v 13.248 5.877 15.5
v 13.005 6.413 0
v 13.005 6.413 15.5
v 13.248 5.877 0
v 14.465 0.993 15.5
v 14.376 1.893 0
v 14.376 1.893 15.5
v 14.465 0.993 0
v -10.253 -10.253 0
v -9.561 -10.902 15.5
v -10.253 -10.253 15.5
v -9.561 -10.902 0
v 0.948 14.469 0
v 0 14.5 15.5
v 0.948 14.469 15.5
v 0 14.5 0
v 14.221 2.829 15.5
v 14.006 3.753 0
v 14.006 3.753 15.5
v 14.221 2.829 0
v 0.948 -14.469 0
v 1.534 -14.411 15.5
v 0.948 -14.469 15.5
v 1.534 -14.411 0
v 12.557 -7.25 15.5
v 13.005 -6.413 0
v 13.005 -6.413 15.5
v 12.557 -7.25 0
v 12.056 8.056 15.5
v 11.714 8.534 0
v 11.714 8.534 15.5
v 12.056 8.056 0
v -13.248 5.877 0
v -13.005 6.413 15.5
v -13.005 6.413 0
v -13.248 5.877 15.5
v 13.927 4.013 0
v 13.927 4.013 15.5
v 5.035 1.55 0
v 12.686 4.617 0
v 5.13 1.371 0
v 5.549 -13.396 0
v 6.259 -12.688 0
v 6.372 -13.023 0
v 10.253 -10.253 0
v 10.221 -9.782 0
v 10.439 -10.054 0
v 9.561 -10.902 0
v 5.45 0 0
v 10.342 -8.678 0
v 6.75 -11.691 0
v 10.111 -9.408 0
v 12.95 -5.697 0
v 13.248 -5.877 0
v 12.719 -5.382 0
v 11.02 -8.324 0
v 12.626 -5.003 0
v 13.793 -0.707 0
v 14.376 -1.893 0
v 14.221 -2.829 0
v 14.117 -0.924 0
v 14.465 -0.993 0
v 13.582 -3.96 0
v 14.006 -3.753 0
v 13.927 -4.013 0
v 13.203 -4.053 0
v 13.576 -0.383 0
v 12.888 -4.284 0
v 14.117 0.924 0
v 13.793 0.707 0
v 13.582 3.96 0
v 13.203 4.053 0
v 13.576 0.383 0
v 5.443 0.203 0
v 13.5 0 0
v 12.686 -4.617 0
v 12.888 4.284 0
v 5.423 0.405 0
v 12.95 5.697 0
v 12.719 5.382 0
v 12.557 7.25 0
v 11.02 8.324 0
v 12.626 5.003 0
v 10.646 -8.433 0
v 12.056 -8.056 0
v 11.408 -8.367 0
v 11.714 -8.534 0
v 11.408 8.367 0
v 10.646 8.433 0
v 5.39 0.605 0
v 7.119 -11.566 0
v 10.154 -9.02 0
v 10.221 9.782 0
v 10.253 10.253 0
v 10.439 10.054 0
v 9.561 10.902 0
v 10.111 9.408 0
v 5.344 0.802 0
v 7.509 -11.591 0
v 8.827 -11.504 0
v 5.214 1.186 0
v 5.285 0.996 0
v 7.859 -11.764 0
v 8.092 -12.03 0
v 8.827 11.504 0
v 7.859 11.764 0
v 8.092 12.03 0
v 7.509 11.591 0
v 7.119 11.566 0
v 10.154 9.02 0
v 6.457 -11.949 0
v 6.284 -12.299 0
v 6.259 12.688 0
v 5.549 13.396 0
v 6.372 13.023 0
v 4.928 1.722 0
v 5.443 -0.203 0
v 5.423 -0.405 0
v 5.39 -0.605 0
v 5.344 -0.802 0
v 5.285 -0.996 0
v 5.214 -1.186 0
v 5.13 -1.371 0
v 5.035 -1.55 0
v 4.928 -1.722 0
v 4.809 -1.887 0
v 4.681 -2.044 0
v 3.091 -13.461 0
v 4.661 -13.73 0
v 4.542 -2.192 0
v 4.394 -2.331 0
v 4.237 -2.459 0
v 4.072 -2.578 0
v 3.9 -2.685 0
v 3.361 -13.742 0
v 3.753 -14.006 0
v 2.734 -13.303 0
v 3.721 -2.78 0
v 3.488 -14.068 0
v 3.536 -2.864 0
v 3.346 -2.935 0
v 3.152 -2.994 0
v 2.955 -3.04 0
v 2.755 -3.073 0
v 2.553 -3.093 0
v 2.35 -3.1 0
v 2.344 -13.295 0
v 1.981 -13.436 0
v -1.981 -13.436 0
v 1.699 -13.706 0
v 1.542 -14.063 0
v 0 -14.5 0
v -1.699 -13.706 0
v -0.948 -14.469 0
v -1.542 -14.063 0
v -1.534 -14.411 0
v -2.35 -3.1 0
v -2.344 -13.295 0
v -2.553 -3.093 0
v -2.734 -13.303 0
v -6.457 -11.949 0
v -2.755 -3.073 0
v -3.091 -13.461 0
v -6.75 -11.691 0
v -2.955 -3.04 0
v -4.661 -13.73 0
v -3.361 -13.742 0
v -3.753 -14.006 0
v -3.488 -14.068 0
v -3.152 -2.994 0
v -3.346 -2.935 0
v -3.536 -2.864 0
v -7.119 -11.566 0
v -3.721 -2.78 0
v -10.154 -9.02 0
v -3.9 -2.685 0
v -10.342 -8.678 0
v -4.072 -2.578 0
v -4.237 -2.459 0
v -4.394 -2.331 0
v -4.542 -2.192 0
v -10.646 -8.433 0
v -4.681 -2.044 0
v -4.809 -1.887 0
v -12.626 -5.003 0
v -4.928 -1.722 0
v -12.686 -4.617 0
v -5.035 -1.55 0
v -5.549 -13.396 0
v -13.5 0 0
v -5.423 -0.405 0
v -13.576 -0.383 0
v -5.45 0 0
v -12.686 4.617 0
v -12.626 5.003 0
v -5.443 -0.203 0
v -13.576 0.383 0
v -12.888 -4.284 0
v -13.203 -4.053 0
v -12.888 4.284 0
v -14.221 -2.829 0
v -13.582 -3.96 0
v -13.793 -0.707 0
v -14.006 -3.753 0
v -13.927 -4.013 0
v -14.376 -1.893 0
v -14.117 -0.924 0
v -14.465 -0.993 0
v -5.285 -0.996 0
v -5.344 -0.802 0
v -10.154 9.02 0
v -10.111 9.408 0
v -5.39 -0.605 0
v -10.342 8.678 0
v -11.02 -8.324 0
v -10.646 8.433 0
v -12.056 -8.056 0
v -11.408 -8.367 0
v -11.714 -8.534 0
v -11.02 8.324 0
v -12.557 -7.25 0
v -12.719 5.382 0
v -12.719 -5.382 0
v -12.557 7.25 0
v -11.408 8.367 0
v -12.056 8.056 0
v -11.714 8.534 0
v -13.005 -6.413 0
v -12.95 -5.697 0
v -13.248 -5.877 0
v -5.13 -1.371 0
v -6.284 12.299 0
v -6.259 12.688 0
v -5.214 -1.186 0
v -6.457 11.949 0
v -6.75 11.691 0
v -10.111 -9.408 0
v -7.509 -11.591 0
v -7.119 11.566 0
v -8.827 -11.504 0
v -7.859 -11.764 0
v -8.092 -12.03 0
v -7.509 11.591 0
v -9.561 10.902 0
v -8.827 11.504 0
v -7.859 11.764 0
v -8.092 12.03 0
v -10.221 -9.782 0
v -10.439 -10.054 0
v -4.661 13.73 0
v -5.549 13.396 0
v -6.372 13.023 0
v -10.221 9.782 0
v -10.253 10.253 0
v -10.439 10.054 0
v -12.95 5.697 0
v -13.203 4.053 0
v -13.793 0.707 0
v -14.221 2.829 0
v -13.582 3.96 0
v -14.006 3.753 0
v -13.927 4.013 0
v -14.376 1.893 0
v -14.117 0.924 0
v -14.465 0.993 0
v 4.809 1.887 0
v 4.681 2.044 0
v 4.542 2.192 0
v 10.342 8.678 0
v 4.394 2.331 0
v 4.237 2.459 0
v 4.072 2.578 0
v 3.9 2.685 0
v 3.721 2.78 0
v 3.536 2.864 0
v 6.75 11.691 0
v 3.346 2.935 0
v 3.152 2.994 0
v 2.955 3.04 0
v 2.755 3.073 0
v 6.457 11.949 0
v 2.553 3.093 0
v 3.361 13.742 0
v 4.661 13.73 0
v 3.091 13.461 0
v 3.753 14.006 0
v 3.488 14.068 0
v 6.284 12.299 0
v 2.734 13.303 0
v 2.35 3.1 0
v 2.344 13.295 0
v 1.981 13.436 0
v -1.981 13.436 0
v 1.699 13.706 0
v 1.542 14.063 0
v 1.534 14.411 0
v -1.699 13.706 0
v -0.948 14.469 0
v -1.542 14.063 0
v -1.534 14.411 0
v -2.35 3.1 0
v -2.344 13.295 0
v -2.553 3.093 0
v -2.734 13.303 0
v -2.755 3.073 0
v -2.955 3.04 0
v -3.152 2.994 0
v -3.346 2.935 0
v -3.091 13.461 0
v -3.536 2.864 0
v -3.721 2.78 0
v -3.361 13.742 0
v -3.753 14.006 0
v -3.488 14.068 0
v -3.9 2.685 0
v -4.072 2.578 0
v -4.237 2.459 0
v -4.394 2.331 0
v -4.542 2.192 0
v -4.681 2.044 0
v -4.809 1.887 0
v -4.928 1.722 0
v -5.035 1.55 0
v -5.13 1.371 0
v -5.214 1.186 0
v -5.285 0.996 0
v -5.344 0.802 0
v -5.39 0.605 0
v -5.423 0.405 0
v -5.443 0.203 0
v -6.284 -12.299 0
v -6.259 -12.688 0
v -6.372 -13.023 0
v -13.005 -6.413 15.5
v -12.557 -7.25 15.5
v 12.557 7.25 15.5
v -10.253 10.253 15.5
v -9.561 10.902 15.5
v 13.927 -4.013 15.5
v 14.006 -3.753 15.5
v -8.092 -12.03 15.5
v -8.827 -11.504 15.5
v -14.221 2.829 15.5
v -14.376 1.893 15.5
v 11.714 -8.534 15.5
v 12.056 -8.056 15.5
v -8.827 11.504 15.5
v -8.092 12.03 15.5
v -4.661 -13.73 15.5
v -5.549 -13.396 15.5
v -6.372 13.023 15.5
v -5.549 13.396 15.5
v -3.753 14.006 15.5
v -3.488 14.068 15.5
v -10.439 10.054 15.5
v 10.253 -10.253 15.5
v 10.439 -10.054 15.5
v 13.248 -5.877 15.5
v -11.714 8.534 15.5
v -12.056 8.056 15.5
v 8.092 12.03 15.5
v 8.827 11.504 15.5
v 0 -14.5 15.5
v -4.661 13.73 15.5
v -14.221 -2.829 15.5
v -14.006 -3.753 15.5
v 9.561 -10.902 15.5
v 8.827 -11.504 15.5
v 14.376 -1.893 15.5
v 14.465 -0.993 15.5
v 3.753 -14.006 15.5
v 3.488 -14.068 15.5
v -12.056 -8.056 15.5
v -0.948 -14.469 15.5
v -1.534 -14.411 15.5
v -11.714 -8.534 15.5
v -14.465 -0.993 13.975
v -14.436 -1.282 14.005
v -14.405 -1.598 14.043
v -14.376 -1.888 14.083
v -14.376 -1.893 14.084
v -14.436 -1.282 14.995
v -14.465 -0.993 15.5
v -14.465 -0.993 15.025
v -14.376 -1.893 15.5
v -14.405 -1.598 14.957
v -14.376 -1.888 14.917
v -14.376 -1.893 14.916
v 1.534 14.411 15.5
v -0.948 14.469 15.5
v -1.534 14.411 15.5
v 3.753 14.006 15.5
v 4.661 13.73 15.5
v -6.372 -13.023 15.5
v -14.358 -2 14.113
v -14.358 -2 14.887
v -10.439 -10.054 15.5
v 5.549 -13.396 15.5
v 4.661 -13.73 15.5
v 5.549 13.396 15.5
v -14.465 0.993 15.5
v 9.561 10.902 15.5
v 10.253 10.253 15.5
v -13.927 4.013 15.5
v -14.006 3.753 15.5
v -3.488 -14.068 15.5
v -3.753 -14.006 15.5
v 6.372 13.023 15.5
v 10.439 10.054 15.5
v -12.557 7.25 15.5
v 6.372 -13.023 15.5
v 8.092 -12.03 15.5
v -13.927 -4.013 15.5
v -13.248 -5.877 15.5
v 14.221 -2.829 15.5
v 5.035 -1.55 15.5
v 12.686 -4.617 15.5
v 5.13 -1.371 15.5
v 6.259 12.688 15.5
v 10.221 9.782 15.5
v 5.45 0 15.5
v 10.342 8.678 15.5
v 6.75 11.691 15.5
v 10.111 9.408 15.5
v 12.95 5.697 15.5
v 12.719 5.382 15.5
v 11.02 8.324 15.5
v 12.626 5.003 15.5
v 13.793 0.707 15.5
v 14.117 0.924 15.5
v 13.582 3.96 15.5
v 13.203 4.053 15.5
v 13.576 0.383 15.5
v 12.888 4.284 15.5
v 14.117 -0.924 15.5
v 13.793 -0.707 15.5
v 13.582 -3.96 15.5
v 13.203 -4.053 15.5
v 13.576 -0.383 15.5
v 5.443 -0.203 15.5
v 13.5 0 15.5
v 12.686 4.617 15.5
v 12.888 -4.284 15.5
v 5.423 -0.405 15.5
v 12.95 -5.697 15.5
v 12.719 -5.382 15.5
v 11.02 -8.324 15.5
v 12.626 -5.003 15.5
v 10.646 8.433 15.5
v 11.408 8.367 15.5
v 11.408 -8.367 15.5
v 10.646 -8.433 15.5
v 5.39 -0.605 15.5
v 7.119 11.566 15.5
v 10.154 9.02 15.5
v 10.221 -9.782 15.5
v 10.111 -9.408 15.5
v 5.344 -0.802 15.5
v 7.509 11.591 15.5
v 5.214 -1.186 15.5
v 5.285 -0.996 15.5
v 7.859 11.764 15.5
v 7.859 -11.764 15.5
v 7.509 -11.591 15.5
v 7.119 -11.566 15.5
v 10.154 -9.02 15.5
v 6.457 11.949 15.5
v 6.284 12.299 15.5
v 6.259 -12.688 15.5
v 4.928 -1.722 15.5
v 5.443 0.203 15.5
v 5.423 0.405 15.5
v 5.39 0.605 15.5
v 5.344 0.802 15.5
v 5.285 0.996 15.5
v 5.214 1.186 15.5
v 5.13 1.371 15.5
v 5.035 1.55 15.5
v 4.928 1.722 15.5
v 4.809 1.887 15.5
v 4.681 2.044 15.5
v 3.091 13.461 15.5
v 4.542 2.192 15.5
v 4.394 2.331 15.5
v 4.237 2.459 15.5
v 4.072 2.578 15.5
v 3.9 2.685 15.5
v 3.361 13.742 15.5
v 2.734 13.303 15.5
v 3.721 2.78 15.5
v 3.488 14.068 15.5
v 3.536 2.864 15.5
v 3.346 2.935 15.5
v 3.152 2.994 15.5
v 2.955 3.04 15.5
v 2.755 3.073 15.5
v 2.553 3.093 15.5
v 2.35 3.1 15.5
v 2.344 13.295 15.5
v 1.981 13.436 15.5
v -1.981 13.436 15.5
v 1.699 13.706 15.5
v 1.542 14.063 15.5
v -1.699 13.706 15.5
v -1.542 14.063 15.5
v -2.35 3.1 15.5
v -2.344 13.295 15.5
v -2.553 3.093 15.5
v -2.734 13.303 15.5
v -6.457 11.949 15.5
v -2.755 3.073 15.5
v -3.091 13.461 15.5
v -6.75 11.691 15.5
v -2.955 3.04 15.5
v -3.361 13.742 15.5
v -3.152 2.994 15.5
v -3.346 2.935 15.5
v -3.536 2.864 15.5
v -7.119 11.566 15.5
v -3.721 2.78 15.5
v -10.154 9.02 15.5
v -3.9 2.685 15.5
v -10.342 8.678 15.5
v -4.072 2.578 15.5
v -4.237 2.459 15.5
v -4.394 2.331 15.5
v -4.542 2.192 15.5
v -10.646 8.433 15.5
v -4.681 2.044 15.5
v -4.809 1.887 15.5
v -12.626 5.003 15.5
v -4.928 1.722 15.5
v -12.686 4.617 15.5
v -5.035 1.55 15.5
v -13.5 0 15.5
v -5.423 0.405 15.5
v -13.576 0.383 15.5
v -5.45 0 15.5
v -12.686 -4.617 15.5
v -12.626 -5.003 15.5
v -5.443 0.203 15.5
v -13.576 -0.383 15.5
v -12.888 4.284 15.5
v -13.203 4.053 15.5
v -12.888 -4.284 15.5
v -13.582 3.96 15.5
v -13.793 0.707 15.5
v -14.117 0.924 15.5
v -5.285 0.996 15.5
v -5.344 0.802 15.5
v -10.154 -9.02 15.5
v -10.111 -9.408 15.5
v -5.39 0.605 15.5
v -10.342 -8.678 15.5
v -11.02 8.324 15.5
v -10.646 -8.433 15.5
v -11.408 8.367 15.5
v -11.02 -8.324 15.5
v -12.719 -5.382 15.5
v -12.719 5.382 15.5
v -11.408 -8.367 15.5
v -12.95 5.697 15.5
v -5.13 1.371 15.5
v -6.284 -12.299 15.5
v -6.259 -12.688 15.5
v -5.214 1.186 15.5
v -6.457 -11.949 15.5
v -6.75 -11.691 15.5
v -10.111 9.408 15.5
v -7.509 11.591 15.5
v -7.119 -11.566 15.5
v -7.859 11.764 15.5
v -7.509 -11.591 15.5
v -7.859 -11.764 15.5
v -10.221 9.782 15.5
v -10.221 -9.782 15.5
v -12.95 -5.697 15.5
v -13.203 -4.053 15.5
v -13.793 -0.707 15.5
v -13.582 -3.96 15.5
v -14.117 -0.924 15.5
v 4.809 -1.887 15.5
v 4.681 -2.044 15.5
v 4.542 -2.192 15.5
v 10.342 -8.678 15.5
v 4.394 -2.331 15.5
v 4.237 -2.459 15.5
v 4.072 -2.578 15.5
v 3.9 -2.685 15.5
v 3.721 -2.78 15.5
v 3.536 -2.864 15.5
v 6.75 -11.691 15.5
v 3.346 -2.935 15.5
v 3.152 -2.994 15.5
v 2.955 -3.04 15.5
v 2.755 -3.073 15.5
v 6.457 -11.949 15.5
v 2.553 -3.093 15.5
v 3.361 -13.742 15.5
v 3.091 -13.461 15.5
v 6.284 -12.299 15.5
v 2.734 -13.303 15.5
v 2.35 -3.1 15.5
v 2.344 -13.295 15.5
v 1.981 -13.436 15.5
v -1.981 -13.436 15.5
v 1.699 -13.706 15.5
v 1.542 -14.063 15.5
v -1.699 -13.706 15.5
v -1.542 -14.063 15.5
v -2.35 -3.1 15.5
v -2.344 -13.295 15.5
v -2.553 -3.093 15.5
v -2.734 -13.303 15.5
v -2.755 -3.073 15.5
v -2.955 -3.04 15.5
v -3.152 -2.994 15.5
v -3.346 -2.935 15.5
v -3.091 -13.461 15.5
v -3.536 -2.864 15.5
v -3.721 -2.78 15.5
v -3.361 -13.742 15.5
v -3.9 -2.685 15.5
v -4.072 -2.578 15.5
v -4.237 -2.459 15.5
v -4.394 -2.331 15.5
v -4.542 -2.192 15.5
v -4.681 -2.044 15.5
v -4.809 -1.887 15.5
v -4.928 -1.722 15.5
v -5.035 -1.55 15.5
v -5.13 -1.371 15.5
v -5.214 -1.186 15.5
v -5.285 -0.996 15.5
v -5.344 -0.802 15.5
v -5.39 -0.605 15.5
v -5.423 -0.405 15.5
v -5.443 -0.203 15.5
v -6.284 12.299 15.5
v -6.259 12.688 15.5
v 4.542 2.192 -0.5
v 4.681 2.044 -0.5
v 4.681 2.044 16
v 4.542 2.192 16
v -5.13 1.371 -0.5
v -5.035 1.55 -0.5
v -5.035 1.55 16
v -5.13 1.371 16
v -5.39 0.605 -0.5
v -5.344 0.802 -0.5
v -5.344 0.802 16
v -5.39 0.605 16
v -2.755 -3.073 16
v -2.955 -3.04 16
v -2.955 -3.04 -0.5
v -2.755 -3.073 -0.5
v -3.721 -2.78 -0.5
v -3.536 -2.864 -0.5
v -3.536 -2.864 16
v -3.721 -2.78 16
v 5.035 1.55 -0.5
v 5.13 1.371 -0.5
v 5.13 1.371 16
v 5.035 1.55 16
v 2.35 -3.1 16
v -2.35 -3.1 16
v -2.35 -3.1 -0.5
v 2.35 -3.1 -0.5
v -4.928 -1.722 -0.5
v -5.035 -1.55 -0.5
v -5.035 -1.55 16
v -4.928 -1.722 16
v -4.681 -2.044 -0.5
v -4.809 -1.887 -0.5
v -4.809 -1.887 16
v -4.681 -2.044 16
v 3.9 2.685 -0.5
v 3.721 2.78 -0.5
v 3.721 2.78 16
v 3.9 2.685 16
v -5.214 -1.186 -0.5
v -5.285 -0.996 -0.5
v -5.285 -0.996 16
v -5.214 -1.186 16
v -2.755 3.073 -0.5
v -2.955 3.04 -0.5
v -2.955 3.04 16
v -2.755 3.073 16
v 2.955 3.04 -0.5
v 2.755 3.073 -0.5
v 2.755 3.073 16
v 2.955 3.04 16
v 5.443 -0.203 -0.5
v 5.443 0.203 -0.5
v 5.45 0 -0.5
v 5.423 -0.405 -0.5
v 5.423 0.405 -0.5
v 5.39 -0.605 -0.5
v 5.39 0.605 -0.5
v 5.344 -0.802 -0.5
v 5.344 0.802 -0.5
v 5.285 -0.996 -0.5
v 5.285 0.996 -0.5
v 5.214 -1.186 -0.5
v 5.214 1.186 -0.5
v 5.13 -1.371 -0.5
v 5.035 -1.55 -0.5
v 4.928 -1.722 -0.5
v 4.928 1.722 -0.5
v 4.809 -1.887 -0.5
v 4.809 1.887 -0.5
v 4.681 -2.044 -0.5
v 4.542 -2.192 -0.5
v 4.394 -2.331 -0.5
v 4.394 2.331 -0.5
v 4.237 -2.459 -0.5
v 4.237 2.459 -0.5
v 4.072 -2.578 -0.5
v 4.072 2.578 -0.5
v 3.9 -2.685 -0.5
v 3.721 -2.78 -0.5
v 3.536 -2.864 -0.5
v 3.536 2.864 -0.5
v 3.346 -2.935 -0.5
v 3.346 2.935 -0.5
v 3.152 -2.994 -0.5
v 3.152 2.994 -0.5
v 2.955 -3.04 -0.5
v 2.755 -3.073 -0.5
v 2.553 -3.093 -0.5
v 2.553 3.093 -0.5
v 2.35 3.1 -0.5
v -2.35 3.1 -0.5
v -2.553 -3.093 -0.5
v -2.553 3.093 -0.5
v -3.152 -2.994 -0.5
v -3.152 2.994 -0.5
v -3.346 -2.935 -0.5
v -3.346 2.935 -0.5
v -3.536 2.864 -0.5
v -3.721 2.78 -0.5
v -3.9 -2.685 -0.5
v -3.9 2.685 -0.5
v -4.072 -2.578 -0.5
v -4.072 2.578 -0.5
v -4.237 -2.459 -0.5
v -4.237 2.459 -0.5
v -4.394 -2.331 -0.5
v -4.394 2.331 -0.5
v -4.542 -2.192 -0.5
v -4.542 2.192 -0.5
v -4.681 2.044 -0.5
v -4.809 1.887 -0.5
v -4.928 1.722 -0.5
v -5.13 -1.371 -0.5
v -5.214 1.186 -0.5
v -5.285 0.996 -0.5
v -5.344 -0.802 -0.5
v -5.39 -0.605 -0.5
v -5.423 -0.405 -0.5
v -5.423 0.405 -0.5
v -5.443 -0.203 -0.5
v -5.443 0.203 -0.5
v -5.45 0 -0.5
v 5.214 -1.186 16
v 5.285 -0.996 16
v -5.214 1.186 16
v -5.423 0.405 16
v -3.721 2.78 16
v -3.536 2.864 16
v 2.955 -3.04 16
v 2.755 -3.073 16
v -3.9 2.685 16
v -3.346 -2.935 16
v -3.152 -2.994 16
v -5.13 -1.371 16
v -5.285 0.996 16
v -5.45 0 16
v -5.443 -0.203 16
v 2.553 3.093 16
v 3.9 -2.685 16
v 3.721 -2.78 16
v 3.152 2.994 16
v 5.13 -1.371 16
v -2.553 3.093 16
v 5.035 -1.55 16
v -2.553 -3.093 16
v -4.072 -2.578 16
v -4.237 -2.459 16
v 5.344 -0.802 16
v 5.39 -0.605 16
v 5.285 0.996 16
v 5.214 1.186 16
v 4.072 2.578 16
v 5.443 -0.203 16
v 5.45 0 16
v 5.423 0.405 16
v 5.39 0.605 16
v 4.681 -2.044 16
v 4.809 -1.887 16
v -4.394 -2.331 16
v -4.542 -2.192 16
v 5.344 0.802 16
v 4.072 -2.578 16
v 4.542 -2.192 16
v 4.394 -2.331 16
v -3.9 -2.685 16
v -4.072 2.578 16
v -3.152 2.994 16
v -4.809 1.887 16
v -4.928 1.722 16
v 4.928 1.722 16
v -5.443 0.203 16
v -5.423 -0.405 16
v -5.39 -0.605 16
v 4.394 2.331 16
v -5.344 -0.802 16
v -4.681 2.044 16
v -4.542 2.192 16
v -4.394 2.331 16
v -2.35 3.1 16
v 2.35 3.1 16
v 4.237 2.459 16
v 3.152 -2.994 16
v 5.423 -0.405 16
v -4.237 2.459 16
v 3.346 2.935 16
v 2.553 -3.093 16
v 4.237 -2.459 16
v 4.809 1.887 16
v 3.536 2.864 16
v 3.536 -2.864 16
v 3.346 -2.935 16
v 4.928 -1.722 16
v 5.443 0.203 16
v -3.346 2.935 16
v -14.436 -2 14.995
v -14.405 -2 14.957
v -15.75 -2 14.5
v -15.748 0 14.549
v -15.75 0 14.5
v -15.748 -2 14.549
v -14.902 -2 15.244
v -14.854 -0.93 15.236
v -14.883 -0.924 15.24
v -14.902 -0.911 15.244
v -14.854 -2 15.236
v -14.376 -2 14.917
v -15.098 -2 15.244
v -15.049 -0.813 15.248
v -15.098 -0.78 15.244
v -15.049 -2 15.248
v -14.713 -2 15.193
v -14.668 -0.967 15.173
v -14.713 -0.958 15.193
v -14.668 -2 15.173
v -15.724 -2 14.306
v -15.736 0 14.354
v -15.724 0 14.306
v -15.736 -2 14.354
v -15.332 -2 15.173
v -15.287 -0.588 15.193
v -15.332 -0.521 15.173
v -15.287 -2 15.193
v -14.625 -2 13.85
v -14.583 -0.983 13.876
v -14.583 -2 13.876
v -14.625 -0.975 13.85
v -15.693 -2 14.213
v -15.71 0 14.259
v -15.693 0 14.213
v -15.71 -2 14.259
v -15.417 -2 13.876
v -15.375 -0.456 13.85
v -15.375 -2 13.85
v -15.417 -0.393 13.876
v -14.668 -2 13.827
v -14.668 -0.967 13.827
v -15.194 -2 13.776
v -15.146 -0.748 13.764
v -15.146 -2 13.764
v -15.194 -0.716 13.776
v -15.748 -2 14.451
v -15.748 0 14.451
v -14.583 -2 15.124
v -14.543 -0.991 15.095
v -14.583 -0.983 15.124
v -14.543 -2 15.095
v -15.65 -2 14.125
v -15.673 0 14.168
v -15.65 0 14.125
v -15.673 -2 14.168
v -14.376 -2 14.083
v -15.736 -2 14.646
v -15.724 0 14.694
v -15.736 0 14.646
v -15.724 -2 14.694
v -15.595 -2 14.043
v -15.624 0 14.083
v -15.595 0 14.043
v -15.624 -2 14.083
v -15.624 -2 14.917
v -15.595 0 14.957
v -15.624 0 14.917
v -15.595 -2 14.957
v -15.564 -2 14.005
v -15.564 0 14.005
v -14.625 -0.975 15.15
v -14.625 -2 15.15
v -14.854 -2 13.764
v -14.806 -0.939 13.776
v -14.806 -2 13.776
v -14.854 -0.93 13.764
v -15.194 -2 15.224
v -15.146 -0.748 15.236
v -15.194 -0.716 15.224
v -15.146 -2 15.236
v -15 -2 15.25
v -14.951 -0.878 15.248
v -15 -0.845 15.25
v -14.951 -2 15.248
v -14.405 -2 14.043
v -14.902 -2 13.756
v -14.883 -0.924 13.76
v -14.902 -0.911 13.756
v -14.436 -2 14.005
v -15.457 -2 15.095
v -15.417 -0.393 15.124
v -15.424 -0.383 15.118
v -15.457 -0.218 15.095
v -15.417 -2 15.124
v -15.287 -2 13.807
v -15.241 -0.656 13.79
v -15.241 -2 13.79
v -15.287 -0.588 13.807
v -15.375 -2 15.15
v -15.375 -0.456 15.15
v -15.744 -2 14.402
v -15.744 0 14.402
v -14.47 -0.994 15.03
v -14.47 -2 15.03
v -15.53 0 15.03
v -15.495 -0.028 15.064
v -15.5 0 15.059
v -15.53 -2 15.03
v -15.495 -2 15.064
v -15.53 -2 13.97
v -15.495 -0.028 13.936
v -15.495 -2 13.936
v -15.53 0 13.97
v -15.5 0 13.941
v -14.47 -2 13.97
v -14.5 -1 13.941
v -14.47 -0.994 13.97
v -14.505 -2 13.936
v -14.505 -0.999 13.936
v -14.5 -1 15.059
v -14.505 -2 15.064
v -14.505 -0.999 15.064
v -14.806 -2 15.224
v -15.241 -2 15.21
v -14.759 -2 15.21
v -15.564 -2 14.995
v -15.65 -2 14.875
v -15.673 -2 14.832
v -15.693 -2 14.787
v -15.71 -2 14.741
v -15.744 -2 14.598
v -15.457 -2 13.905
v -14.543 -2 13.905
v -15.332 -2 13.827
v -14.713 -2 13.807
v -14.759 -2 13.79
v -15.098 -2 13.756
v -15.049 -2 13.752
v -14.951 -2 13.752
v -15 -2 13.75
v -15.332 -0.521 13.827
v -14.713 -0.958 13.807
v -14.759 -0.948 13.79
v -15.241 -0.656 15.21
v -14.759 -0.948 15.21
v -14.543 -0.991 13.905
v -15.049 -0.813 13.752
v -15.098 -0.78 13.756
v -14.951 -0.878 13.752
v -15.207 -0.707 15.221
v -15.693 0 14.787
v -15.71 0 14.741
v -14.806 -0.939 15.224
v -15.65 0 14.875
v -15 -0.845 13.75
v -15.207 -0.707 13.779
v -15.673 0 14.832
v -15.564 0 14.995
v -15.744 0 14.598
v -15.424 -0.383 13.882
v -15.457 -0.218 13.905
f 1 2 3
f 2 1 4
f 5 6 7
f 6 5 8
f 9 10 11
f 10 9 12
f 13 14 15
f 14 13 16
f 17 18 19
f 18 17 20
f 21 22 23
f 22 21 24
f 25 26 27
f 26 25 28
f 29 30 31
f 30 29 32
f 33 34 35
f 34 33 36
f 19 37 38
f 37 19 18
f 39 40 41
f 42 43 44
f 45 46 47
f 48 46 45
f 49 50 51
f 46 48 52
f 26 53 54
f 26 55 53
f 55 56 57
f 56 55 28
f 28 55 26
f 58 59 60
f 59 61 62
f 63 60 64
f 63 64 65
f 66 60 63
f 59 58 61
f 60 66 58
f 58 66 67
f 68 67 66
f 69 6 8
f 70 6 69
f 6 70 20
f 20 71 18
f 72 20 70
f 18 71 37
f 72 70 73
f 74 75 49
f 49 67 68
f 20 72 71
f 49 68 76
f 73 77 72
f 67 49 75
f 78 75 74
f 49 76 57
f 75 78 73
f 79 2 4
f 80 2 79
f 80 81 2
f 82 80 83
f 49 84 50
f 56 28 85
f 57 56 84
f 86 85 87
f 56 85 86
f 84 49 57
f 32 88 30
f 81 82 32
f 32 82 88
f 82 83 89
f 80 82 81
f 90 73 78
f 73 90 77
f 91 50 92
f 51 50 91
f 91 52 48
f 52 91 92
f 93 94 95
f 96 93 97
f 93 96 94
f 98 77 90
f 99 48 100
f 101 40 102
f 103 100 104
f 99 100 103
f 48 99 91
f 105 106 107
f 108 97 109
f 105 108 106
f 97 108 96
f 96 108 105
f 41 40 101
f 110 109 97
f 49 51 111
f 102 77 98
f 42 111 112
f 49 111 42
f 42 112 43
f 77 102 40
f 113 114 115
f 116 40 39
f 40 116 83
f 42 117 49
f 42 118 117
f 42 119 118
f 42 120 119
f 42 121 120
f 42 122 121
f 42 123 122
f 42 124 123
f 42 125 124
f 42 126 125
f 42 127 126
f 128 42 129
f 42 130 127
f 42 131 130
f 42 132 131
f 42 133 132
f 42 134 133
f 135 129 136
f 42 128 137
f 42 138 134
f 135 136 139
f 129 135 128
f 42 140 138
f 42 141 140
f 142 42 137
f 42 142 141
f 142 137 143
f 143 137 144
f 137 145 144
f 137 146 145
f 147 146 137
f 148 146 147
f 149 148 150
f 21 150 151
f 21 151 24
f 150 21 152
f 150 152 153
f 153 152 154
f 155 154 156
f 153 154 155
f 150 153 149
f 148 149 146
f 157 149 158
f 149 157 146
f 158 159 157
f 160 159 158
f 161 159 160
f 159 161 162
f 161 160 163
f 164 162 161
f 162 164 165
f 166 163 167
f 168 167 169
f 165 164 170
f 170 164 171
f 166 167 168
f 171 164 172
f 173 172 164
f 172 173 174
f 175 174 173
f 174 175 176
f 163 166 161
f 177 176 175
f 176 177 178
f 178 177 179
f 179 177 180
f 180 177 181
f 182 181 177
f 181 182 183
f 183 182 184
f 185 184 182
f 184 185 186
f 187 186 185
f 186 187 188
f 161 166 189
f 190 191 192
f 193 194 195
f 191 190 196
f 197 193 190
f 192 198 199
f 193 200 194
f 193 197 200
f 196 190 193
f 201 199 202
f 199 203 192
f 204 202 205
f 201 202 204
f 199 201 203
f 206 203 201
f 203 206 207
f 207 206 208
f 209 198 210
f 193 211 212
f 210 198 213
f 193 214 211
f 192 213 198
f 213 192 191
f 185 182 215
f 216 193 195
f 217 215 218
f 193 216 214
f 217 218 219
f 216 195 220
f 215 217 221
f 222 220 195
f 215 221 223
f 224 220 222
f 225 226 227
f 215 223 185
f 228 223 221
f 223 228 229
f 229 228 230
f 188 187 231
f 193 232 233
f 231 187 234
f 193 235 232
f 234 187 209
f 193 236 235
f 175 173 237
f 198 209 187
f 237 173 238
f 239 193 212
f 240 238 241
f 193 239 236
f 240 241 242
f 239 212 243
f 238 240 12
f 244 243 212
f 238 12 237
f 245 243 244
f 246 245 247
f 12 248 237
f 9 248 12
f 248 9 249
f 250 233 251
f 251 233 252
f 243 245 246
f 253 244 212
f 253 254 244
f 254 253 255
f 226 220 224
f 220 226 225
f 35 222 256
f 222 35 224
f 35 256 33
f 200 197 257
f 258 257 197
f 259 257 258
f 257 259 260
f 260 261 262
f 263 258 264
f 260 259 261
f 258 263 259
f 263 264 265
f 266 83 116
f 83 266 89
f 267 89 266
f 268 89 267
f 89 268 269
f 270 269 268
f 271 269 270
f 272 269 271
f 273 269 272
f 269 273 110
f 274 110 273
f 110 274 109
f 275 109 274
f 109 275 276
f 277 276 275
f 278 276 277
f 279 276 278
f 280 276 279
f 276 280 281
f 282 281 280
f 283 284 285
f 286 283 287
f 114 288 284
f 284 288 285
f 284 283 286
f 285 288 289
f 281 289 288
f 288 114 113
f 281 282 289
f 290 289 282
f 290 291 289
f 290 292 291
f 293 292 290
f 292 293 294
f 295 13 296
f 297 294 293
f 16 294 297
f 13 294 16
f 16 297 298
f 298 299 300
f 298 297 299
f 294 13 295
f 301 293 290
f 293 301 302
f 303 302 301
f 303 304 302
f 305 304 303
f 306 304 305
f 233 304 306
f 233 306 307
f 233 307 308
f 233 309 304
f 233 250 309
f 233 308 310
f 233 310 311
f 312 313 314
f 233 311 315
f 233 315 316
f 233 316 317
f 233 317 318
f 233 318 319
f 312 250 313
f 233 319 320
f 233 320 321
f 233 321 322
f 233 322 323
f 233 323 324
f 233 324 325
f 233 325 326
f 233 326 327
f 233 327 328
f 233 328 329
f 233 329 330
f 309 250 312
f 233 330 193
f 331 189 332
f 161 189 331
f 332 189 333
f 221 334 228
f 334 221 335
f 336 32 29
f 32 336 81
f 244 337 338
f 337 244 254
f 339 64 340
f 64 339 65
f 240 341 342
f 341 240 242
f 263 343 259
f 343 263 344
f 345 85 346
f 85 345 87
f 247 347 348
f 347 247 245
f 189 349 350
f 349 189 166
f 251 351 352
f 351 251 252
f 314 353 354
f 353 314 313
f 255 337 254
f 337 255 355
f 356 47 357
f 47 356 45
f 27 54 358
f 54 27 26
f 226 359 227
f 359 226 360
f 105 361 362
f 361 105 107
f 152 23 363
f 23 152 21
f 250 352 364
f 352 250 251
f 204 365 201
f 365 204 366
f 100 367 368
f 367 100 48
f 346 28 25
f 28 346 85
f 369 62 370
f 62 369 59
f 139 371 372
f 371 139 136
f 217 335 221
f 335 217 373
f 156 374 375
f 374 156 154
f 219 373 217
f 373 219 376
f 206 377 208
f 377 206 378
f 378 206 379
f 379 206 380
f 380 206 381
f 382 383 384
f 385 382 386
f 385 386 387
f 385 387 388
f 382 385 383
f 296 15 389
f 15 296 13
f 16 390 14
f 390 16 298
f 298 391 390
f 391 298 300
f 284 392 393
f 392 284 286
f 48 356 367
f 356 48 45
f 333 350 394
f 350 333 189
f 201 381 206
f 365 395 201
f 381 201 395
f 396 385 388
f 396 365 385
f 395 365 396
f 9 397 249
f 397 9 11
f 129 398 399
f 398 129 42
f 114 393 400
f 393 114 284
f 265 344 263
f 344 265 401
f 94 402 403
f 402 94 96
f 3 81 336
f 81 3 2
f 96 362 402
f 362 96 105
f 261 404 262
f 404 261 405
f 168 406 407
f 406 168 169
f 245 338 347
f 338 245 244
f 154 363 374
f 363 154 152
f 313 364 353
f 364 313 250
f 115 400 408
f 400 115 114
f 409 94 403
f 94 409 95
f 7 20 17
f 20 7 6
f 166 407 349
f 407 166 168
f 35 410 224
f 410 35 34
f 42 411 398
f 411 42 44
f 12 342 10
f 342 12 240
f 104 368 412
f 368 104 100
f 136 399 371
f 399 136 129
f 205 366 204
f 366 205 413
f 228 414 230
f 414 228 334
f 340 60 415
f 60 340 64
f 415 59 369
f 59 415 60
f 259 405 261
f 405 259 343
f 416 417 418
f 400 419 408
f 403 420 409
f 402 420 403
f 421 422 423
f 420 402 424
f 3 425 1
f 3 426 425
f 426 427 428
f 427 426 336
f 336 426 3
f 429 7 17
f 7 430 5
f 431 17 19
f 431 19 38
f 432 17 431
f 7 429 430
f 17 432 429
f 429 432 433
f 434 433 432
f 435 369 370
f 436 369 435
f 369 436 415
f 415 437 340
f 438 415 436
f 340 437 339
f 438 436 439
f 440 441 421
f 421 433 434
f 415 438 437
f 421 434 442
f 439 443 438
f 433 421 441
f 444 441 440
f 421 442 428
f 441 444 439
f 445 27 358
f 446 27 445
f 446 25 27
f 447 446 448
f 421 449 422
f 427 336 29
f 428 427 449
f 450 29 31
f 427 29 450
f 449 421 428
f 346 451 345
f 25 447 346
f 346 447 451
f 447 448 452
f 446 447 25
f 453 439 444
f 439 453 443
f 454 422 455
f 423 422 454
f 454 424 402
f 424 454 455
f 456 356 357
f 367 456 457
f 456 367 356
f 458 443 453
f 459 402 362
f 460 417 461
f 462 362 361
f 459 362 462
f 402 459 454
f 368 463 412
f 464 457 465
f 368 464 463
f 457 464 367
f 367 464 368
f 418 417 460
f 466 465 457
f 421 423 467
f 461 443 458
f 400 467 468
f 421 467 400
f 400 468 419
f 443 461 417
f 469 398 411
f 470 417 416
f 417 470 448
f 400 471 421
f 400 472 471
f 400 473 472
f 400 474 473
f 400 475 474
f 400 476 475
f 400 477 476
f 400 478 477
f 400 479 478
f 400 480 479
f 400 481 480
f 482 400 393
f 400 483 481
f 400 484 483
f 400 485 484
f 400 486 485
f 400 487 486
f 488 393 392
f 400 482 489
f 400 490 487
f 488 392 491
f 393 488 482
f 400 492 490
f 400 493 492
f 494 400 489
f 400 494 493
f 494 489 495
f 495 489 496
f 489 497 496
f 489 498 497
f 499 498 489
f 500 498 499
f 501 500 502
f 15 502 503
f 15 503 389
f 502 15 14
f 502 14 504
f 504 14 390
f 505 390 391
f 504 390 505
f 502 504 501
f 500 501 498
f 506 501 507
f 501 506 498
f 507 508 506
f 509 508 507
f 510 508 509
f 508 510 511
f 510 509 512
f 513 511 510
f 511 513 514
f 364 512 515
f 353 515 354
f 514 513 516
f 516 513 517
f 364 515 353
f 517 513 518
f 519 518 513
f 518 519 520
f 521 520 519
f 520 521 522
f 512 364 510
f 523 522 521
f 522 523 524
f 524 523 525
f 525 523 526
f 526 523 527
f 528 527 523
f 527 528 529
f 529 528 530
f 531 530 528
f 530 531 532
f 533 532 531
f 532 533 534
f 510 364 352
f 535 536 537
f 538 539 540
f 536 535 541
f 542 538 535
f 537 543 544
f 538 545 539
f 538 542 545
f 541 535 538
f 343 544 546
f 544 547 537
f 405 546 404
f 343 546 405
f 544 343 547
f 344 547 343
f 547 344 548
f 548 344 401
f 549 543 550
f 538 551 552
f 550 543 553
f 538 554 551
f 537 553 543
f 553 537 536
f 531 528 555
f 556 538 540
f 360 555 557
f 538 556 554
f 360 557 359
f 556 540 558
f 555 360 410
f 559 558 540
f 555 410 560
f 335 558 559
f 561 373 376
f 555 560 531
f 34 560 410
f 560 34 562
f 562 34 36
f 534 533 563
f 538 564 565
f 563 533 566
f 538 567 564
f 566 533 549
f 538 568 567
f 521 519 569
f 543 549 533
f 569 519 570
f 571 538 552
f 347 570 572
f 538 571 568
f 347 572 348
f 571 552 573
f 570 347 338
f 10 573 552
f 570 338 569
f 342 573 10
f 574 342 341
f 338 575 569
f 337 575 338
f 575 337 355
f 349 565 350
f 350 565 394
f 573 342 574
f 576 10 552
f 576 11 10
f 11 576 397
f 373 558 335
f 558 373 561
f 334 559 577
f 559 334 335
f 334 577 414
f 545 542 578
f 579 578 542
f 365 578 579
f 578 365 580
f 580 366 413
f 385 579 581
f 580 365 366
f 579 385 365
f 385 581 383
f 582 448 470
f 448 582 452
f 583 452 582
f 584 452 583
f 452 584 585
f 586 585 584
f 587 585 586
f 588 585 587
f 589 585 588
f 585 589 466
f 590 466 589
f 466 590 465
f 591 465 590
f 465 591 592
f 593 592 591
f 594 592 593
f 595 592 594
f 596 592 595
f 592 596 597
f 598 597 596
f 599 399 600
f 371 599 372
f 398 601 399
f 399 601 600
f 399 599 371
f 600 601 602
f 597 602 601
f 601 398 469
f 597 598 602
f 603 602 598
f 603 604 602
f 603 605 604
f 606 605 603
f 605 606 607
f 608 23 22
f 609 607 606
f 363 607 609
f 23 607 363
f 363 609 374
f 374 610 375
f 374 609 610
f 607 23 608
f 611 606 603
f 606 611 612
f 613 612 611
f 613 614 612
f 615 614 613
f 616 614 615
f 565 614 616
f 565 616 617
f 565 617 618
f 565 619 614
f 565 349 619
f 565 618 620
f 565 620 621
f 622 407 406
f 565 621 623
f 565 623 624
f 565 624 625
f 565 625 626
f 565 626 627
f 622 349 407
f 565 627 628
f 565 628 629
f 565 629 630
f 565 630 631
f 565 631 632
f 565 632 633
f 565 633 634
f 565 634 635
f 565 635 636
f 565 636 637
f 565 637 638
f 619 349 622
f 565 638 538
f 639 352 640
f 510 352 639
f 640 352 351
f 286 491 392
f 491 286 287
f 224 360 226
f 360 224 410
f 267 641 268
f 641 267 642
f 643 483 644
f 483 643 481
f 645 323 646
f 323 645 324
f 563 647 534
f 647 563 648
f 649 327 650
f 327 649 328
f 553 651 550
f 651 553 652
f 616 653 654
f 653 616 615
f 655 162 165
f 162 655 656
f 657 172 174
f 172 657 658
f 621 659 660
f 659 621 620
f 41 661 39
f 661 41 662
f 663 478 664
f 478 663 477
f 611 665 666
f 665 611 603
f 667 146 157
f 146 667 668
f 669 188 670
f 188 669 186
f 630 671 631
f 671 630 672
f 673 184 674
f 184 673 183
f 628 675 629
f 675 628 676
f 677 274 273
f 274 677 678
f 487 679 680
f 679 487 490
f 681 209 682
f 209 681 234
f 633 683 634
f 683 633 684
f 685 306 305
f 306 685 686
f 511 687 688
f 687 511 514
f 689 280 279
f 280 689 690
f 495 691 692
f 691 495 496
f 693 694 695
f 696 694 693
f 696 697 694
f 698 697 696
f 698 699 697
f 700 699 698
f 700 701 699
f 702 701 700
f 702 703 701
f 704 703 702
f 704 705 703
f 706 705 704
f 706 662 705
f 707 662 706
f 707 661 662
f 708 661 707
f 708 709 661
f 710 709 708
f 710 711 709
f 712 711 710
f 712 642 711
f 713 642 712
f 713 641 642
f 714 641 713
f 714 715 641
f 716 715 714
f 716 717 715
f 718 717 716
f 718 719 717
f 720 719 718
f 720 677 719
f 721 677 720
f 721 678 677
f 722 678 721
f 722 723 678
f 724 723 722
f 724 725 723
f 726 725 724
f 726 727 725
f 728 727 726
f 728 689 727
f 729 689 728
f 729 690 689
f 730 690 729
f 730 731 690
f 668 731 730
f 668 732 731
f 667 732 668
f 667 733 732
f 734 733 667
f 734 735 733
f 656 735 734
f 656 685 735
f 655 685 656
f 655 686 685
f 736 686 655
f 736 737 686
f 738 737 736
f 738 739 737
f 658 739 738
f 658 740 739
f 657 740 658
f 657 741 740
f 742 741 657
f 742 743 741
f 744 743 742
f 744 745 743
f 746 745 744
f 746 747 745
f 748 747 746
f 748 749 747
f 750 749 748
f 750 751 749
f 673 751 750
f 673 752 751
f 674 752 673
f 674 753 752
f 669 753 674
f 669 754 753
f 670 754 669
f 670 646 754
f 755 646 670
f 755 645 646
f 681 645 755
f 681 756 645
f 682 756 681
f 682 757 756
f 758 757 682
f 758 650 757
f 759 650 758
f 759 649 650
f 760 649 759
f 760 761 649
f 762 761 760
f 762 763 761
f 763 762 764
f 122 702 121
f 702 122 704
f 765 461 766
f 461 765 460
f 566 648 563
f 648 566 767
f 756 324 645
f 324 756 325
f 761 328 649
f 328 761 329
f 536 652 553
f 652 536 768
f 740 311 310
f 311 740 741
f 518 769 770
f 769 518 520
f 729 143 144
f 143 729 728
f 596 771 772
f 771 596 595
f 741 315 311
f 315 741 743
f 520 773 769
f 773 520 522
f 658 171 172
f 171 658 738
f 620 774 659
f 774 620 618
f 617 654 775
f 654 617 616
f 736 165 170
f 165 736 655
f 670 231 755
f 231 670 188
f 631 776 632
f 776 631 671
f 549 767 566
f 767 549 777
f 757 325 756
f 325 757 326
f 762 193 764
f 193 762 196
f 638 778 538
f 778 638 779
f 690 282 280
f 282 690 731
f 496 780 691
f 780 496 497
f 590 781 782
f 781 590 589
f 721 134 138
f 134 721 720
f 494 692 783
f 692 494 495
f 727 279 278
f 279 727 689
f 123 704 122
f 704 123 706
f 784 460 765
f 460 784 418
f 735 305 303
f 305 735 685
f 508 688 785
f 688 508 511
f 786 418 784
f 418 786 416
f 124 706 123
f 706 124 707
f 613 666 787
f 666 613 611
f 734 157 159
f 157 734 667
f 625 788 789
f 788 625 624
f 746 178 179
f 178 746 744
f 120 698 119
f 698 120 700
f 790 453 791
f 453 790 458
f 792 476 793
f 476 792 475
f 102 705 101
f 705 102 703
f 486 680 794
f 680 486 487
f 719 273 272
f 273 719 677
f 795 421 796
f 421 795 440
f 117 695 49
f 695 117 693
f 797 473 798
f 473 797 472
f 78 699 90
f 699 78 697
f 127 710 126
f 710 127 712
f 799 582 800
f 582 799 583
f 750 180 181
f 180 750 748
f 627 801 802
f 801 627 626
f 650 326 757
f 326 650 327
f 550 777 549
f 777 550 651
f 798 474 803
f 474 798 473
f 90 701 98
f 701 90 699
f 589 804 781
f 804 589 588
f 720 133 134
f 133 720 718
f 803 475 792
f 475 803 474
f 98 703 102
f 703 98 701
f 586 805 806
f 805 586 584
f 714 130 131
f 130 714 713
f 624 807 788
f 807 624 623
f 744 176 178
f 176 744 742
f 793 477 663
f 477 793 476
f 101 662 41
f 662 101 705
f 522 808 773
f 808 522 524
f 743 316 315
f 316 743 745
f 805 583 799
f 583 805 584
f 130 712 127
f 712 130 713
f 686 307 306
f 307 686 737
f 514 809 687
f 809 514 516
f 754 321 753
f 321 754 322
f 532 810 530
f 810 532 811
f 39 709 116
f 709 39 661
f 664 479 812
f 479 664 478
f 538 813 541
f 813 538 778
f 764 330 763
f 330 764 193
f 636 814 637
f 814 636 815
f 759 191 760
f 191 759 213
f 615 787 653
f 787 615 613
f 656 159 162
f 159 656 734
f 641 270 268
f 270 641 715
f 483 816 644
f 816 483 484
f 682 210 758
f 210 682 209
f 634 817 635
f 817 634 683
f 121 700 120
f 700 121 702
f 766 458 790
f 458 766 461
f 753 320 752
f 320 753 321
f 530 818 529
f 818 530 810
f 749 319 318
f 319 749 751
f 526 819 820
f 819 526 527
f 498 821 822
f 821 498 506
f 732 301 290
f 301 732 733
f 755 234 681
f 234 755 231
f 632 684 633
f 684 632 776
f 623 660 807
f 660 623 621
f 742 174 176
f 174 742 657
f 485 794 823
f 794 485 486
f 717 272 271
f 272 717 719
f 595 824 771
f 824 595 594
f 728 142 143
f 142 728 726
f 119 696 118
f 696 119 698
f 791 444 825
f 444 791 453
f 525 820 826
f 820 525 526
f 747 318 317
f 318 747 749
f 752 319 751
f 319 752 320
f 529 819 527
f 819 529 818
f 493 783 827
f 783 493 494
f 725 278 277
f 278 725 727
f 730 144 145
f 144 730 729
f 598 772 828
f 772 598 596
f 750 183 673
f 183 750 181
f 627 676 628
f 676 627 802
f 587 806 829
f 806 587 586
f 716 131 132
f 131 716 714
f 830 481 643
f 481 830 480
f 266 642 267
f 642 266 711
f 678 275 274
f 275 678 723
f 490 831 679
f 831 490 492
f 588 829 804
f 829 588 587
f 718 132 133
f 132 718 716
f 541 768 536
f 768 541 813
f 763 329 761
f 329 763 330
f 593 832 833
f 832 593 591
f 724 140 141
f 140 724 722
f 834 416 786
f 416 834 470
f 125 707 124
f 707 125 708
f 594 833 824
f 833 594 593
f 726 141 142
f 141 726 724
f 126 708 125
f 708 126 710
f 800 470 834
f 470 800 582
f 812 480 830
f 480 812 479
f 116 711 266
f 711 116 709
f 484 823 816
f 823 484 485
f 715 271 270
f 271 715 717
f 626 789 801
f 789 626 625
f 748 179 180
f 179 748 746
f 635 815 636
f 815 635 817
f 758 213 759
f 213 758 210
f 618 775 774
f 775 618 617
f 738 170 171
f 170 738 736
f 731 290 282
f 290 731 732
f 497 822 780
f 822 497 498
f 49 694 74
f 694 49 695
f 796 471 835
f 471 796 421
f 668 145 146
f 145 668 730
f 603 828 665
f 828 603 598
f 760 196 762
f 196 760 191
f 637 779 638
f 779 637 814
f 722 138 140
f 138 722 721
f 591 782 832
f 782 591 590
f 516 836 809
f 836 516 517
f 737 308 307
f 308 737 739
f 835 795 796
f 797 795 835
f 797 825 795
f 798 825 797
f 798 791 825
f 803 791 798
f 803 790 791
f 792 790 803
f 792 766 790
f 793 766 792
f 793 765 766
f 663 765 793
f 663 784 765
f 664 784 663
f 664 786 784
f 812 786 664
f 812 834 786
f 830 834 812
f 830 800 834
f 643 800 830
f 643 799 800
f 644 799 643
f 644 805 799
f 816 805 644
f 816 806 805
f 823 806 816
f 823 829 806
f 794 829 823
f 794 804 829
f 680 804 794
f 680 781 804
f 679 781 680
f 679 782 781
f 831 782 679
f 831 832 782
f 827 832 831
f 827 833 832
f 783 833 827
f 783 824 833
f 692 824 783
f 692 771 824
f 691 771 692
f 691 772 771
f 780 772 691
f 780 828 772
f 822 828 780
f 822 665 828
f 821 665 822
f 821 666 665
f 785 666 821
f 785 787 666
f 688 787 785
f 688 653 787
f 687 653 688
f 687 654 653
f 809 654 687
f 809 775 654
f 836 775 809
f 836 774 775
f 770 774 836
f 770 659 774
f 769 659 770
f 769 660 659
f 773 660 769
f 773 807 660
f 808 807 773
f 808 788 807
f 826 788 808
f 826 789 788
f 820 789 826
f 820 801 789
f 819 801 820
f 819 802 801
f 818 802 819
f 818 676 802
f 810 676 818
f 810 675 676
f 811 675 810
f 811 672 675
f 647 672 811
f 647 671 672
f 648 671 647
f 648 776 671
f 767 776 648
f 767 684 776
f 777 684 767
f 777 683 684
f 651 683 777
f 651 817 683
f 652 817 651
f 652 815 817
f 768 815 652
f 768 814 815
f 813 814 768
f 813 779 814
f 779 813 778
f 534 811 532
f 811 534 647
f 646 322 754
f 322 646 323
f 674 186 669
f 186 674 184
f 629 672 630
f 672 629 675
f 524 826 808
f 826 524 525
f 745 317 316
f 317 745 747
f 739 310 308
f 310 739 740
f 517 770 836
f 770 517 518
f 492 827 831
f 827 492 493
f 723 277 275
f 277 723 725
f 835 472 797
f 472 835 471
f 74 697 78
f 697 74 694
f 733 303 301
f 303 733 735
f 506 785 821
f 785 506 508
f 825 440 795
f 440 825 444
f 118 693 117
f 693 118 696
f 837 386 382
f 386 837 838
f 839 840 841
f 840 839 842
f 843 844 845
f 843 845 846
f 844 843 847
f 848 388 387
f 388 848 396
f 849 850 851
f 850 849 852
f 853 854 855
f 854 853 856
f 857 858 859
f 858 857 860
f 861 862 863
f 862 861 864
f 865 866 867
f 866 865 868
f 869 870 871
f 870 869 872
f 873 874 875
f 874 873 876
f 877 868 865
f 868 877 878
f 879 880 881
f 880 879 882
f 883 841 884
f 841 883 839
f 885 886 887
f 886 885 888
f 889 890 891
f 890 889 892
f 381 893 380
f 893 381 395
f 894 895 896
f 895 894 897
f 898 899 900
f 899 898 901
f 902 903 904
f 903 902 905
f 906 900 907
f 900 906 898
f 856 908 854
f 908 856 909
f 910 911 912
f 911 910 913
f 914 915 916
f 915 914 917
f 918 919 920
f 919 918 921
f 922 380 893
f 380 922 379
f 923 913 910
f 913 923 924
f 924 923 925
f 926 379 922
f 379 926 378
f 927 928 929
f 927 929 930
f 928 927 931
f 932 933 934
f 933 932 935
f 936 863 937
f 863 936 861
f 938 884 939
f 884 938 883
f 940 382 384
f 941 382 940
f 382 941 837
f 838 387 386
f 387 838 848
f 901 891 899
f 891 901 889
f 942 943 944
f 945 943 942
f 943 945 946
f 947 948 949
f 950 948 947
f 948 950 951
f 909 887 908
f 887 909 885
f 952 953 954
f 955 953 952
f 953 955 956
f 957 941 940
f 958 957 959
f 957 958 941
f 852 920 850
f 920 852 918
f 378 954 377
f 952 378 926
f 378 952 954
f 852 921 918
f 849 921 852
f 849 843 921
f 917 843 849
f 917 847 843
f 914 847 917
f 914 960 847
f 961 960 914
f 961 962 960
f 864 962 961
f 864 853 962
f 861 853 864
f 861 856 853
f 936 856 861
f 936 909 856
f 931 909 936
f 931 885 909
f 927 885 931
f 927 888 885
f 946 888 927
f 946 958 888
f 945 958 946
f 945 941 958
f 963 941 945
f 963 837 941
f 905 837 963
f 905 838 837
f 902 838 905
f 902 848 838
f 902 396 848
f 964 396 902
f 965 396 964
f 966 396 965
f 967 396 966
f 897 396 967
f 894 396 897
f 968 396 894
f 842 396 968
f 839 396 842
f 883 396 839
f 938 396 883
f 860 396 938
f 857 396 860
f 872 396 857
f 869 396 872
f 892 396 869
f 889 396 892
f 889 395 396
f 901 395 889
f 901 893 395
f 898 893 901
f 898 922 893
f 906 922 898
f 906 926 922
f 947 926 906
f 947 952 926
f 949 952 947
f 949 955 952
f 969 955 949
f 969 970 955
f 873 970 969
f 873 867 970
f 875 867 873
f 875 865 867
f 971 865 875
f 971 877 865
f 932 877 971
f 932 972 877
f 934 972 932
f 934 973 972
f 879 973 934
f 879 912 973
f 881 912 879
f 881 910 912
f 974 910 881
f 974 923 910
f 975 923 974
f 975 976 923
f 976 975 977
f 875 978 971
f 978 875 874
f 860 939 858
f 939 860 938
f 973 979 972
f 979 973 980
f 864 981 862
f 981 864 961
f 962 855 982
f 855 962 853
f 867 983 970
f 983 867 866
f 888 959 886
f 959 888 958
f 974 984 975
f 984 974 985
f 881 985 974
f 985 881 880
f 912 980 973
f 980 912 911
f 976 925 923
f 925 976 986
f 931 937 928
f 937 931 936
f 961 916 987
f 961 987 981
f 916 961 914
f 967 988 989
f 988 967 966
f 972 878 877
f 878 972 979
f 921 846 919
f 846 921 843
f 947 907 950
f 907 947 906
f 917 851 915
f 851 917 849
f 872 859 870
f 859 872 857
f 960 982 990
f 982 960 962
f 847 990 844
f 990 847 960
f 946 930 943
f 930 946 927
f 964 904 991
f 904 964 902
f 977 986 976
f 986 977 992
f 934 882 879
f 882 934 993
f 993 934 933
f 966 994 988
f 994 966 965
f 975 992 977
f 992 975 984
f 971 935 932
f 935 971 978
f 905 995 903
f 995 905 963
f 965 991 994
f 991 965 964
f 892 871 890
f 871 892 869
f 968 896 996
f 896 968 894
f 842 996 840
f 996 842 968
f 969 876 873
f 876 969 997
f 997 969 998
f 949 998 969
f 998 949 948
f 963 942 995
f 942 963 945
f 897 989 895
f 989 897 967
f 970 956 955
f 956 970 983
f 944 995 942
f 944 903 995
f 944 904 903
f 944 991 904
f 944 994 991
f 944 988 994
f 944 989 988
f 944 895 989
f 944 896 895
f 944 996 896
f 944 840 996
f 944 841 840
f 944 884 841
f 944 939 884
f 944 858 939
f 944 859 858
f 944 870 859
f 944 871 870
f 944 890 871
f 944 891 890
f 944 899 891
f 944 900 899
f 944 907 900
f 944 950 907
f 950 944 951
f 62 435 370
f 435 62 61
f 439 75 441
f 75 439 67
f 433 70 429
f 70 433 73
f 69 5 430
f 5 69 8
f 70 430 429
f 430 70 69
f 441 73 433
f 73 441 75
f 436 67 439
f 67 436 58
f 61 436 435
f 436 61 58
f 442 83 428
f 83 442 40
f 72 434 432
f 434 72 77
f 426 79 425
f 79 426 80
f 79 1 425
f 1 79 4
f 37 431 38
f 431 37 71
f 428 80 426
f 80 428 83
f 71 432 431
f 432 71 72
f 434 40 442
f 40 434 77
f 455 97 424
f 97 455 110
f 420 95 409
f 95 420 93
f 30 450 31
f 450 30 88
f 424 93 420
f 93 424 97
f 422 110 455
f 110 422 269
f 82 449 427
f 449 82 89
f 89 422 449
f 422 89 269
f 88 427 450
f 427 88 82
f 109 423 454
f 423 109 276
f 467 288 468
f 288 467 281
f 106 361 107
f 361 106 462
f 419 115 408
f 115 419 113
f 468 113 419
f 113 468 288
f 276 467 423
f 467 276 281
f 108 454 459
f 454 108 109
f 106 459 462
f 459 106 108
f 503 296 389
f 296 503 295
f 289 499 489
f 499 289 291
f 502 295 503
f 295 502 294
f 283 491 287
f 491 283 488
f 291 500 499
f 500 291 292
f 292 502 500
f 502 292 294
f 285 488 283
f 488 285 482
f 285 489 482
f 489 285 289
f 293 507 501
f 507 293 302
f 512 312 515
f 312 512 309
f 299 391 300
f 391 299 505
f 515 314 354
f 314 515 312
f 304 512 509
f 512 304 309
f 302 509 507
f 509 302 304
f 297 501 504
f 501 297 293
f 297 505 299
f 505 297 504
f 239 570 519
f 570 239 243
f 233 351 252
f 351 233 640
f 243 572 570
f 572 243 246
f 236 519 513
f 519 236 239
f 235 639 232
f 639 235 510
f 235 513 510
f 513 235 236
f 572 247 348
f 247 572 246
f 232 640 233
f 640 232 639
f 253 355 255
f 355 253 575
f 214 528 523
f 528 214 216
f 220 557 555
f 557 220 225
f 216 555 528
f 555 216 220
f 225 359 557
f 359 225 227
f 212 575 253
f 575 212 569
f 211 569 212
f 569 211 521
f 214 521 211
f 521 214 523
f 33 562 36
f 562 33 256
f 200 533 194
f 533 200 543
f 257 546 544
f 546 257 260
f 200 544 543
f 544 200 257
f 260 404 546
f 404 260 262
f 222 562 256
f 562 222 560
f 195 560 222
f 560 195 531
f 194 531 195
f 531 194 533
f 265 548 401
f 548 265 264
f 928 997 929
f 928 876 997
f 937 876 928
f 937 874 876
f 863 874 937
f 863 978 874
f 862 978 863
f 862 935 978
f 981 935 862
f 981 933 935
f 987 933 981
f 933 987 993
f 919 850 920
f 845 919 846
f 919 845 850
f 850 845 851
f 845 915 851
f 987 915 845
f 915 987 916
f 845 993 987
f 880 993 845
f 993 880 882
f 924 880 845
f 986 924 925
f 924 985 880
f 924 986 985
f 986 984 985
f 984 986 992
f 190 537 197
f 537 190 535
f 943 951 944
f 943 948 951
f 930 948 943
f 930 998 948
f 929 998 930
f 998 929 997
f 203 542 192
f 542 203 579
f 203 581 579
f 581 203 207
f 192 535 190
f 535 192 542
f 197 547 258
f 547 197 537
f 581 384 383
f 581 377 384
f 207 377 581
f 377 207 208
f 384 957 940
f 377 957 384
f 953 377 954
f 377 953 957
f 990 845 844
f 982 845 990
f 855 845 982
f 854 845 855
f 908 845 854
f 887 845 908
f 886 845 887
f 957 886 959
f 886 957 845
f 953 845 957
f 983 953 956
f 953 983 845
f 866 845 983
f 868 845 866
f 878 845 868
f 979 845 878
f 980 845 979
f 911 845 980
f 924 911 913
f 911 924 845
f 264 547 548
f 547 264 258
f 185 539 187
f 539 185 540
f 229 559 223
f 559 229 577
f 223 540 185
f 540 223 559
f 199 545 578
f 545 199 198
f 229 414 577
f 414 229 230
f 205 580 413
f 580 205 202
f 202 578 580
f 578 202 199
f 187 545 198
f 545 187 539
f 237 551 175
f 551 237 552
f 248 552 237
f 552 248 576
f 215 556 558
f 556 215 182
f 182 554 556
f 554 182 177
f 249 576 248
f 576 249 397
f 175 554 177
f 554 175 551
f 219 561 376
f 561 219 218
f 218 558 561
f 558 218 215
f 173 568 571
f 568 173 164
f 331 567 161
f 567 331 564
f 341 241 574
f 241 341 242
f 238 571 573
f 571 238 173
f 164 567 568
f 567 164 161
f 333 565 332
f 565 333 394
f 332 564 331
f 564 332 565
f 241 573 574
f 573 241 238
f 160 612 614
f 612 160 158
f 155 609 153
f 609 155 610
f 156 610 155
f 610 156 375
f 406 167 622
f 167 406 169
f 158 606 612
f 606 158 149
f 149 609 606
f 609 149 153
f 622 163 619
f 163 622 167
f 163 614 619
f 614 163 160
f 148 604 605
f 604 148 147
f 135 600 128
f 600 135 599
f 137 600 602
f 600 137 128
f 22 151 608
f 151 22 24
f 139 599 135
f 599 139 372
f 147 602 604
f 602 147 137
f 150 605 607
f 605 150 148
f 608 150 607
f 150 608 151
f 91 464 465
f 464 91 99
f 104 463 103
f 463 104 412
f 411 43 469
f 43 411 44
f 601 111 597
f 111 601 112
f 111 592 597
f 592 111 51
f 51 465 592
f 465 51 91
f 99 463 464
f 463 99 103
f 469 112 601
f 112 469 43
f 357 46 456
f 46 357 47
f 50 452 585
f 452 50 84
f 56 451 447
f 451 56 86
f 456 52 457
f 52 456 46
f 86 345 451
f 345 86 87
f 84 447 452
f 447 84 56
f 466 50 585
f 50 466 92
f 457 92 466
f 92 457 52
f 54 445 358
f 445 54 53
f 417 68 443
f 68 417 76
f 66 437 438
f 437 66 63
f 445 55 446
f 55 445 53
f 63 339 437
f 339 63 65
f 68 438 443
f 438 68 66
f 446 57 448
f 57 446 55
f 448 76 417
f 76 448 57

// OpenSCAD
// Replacement knob for hotplate stirrer (D-shaft 6 mm)
// Print orientation: bottom face (with D-bore) on the bed, z = 0

// ---------------- Parameters ----------------
knob_d        = 30;    // knob outer diameter
knob_h        = 15;    // knob height
shaft_d       = 6.2;   // D-bore diameter
shaft_flat    = 4.7;   // distance from D-flat to opposite side
groove_count  = 18;    // number of vertical grip grooves
groove_d      = 2;     // groove diameter (half-cylinder)
pointer_w     = 1.5;   // pointer groove width
pointer_d     = 1;     // pointer groove depth
eps           = 0.5;   // overcut for clean differences

$fn = 96;

// ---------------- Derived ----------------
D = knob_d - 2 * eps;              // outer cylinder diameter (thickened walls)
H = knob_h + eps;                  // full height for groove overcut
r = shaft_d / 2;                   // bore radius
M  = shaft_flat / (2 * r);         // y -> x map for D shape (elliptical flat)

// ---------------- Model ----------------
difference() {
    union() {
        // Main body
        cylinder(d = D, h = H);

        // D-shaped blind bore from bottom face
        translate([0, 0, -eps])
            hull() {
                for (a = [0, 180])
                    rotate([0, 0, a])
                        translate([r * M, 0, 0])
                            cylinder(d = 2 * r, h = H + 2 * eps);
            }

        // Pointer groove, centred on -x axis (same side as flat)
        translate([-D / 2 - eps, 0, H - pointer_d])
            rotate([90, 0, 0])
                cylinder(d = pointer_w, h = pointer_d + 2 * eps);
    }

    // Vertical grip grooves along full height
    for (i = [0 : groove_count - 1])
        rotate([0, 0, i * 360 / groove_count])
            translate([D / 2, 0, -eps])
                cylinder(d = groove_d, h = H + 2 * eps, $fn = 16);
}
